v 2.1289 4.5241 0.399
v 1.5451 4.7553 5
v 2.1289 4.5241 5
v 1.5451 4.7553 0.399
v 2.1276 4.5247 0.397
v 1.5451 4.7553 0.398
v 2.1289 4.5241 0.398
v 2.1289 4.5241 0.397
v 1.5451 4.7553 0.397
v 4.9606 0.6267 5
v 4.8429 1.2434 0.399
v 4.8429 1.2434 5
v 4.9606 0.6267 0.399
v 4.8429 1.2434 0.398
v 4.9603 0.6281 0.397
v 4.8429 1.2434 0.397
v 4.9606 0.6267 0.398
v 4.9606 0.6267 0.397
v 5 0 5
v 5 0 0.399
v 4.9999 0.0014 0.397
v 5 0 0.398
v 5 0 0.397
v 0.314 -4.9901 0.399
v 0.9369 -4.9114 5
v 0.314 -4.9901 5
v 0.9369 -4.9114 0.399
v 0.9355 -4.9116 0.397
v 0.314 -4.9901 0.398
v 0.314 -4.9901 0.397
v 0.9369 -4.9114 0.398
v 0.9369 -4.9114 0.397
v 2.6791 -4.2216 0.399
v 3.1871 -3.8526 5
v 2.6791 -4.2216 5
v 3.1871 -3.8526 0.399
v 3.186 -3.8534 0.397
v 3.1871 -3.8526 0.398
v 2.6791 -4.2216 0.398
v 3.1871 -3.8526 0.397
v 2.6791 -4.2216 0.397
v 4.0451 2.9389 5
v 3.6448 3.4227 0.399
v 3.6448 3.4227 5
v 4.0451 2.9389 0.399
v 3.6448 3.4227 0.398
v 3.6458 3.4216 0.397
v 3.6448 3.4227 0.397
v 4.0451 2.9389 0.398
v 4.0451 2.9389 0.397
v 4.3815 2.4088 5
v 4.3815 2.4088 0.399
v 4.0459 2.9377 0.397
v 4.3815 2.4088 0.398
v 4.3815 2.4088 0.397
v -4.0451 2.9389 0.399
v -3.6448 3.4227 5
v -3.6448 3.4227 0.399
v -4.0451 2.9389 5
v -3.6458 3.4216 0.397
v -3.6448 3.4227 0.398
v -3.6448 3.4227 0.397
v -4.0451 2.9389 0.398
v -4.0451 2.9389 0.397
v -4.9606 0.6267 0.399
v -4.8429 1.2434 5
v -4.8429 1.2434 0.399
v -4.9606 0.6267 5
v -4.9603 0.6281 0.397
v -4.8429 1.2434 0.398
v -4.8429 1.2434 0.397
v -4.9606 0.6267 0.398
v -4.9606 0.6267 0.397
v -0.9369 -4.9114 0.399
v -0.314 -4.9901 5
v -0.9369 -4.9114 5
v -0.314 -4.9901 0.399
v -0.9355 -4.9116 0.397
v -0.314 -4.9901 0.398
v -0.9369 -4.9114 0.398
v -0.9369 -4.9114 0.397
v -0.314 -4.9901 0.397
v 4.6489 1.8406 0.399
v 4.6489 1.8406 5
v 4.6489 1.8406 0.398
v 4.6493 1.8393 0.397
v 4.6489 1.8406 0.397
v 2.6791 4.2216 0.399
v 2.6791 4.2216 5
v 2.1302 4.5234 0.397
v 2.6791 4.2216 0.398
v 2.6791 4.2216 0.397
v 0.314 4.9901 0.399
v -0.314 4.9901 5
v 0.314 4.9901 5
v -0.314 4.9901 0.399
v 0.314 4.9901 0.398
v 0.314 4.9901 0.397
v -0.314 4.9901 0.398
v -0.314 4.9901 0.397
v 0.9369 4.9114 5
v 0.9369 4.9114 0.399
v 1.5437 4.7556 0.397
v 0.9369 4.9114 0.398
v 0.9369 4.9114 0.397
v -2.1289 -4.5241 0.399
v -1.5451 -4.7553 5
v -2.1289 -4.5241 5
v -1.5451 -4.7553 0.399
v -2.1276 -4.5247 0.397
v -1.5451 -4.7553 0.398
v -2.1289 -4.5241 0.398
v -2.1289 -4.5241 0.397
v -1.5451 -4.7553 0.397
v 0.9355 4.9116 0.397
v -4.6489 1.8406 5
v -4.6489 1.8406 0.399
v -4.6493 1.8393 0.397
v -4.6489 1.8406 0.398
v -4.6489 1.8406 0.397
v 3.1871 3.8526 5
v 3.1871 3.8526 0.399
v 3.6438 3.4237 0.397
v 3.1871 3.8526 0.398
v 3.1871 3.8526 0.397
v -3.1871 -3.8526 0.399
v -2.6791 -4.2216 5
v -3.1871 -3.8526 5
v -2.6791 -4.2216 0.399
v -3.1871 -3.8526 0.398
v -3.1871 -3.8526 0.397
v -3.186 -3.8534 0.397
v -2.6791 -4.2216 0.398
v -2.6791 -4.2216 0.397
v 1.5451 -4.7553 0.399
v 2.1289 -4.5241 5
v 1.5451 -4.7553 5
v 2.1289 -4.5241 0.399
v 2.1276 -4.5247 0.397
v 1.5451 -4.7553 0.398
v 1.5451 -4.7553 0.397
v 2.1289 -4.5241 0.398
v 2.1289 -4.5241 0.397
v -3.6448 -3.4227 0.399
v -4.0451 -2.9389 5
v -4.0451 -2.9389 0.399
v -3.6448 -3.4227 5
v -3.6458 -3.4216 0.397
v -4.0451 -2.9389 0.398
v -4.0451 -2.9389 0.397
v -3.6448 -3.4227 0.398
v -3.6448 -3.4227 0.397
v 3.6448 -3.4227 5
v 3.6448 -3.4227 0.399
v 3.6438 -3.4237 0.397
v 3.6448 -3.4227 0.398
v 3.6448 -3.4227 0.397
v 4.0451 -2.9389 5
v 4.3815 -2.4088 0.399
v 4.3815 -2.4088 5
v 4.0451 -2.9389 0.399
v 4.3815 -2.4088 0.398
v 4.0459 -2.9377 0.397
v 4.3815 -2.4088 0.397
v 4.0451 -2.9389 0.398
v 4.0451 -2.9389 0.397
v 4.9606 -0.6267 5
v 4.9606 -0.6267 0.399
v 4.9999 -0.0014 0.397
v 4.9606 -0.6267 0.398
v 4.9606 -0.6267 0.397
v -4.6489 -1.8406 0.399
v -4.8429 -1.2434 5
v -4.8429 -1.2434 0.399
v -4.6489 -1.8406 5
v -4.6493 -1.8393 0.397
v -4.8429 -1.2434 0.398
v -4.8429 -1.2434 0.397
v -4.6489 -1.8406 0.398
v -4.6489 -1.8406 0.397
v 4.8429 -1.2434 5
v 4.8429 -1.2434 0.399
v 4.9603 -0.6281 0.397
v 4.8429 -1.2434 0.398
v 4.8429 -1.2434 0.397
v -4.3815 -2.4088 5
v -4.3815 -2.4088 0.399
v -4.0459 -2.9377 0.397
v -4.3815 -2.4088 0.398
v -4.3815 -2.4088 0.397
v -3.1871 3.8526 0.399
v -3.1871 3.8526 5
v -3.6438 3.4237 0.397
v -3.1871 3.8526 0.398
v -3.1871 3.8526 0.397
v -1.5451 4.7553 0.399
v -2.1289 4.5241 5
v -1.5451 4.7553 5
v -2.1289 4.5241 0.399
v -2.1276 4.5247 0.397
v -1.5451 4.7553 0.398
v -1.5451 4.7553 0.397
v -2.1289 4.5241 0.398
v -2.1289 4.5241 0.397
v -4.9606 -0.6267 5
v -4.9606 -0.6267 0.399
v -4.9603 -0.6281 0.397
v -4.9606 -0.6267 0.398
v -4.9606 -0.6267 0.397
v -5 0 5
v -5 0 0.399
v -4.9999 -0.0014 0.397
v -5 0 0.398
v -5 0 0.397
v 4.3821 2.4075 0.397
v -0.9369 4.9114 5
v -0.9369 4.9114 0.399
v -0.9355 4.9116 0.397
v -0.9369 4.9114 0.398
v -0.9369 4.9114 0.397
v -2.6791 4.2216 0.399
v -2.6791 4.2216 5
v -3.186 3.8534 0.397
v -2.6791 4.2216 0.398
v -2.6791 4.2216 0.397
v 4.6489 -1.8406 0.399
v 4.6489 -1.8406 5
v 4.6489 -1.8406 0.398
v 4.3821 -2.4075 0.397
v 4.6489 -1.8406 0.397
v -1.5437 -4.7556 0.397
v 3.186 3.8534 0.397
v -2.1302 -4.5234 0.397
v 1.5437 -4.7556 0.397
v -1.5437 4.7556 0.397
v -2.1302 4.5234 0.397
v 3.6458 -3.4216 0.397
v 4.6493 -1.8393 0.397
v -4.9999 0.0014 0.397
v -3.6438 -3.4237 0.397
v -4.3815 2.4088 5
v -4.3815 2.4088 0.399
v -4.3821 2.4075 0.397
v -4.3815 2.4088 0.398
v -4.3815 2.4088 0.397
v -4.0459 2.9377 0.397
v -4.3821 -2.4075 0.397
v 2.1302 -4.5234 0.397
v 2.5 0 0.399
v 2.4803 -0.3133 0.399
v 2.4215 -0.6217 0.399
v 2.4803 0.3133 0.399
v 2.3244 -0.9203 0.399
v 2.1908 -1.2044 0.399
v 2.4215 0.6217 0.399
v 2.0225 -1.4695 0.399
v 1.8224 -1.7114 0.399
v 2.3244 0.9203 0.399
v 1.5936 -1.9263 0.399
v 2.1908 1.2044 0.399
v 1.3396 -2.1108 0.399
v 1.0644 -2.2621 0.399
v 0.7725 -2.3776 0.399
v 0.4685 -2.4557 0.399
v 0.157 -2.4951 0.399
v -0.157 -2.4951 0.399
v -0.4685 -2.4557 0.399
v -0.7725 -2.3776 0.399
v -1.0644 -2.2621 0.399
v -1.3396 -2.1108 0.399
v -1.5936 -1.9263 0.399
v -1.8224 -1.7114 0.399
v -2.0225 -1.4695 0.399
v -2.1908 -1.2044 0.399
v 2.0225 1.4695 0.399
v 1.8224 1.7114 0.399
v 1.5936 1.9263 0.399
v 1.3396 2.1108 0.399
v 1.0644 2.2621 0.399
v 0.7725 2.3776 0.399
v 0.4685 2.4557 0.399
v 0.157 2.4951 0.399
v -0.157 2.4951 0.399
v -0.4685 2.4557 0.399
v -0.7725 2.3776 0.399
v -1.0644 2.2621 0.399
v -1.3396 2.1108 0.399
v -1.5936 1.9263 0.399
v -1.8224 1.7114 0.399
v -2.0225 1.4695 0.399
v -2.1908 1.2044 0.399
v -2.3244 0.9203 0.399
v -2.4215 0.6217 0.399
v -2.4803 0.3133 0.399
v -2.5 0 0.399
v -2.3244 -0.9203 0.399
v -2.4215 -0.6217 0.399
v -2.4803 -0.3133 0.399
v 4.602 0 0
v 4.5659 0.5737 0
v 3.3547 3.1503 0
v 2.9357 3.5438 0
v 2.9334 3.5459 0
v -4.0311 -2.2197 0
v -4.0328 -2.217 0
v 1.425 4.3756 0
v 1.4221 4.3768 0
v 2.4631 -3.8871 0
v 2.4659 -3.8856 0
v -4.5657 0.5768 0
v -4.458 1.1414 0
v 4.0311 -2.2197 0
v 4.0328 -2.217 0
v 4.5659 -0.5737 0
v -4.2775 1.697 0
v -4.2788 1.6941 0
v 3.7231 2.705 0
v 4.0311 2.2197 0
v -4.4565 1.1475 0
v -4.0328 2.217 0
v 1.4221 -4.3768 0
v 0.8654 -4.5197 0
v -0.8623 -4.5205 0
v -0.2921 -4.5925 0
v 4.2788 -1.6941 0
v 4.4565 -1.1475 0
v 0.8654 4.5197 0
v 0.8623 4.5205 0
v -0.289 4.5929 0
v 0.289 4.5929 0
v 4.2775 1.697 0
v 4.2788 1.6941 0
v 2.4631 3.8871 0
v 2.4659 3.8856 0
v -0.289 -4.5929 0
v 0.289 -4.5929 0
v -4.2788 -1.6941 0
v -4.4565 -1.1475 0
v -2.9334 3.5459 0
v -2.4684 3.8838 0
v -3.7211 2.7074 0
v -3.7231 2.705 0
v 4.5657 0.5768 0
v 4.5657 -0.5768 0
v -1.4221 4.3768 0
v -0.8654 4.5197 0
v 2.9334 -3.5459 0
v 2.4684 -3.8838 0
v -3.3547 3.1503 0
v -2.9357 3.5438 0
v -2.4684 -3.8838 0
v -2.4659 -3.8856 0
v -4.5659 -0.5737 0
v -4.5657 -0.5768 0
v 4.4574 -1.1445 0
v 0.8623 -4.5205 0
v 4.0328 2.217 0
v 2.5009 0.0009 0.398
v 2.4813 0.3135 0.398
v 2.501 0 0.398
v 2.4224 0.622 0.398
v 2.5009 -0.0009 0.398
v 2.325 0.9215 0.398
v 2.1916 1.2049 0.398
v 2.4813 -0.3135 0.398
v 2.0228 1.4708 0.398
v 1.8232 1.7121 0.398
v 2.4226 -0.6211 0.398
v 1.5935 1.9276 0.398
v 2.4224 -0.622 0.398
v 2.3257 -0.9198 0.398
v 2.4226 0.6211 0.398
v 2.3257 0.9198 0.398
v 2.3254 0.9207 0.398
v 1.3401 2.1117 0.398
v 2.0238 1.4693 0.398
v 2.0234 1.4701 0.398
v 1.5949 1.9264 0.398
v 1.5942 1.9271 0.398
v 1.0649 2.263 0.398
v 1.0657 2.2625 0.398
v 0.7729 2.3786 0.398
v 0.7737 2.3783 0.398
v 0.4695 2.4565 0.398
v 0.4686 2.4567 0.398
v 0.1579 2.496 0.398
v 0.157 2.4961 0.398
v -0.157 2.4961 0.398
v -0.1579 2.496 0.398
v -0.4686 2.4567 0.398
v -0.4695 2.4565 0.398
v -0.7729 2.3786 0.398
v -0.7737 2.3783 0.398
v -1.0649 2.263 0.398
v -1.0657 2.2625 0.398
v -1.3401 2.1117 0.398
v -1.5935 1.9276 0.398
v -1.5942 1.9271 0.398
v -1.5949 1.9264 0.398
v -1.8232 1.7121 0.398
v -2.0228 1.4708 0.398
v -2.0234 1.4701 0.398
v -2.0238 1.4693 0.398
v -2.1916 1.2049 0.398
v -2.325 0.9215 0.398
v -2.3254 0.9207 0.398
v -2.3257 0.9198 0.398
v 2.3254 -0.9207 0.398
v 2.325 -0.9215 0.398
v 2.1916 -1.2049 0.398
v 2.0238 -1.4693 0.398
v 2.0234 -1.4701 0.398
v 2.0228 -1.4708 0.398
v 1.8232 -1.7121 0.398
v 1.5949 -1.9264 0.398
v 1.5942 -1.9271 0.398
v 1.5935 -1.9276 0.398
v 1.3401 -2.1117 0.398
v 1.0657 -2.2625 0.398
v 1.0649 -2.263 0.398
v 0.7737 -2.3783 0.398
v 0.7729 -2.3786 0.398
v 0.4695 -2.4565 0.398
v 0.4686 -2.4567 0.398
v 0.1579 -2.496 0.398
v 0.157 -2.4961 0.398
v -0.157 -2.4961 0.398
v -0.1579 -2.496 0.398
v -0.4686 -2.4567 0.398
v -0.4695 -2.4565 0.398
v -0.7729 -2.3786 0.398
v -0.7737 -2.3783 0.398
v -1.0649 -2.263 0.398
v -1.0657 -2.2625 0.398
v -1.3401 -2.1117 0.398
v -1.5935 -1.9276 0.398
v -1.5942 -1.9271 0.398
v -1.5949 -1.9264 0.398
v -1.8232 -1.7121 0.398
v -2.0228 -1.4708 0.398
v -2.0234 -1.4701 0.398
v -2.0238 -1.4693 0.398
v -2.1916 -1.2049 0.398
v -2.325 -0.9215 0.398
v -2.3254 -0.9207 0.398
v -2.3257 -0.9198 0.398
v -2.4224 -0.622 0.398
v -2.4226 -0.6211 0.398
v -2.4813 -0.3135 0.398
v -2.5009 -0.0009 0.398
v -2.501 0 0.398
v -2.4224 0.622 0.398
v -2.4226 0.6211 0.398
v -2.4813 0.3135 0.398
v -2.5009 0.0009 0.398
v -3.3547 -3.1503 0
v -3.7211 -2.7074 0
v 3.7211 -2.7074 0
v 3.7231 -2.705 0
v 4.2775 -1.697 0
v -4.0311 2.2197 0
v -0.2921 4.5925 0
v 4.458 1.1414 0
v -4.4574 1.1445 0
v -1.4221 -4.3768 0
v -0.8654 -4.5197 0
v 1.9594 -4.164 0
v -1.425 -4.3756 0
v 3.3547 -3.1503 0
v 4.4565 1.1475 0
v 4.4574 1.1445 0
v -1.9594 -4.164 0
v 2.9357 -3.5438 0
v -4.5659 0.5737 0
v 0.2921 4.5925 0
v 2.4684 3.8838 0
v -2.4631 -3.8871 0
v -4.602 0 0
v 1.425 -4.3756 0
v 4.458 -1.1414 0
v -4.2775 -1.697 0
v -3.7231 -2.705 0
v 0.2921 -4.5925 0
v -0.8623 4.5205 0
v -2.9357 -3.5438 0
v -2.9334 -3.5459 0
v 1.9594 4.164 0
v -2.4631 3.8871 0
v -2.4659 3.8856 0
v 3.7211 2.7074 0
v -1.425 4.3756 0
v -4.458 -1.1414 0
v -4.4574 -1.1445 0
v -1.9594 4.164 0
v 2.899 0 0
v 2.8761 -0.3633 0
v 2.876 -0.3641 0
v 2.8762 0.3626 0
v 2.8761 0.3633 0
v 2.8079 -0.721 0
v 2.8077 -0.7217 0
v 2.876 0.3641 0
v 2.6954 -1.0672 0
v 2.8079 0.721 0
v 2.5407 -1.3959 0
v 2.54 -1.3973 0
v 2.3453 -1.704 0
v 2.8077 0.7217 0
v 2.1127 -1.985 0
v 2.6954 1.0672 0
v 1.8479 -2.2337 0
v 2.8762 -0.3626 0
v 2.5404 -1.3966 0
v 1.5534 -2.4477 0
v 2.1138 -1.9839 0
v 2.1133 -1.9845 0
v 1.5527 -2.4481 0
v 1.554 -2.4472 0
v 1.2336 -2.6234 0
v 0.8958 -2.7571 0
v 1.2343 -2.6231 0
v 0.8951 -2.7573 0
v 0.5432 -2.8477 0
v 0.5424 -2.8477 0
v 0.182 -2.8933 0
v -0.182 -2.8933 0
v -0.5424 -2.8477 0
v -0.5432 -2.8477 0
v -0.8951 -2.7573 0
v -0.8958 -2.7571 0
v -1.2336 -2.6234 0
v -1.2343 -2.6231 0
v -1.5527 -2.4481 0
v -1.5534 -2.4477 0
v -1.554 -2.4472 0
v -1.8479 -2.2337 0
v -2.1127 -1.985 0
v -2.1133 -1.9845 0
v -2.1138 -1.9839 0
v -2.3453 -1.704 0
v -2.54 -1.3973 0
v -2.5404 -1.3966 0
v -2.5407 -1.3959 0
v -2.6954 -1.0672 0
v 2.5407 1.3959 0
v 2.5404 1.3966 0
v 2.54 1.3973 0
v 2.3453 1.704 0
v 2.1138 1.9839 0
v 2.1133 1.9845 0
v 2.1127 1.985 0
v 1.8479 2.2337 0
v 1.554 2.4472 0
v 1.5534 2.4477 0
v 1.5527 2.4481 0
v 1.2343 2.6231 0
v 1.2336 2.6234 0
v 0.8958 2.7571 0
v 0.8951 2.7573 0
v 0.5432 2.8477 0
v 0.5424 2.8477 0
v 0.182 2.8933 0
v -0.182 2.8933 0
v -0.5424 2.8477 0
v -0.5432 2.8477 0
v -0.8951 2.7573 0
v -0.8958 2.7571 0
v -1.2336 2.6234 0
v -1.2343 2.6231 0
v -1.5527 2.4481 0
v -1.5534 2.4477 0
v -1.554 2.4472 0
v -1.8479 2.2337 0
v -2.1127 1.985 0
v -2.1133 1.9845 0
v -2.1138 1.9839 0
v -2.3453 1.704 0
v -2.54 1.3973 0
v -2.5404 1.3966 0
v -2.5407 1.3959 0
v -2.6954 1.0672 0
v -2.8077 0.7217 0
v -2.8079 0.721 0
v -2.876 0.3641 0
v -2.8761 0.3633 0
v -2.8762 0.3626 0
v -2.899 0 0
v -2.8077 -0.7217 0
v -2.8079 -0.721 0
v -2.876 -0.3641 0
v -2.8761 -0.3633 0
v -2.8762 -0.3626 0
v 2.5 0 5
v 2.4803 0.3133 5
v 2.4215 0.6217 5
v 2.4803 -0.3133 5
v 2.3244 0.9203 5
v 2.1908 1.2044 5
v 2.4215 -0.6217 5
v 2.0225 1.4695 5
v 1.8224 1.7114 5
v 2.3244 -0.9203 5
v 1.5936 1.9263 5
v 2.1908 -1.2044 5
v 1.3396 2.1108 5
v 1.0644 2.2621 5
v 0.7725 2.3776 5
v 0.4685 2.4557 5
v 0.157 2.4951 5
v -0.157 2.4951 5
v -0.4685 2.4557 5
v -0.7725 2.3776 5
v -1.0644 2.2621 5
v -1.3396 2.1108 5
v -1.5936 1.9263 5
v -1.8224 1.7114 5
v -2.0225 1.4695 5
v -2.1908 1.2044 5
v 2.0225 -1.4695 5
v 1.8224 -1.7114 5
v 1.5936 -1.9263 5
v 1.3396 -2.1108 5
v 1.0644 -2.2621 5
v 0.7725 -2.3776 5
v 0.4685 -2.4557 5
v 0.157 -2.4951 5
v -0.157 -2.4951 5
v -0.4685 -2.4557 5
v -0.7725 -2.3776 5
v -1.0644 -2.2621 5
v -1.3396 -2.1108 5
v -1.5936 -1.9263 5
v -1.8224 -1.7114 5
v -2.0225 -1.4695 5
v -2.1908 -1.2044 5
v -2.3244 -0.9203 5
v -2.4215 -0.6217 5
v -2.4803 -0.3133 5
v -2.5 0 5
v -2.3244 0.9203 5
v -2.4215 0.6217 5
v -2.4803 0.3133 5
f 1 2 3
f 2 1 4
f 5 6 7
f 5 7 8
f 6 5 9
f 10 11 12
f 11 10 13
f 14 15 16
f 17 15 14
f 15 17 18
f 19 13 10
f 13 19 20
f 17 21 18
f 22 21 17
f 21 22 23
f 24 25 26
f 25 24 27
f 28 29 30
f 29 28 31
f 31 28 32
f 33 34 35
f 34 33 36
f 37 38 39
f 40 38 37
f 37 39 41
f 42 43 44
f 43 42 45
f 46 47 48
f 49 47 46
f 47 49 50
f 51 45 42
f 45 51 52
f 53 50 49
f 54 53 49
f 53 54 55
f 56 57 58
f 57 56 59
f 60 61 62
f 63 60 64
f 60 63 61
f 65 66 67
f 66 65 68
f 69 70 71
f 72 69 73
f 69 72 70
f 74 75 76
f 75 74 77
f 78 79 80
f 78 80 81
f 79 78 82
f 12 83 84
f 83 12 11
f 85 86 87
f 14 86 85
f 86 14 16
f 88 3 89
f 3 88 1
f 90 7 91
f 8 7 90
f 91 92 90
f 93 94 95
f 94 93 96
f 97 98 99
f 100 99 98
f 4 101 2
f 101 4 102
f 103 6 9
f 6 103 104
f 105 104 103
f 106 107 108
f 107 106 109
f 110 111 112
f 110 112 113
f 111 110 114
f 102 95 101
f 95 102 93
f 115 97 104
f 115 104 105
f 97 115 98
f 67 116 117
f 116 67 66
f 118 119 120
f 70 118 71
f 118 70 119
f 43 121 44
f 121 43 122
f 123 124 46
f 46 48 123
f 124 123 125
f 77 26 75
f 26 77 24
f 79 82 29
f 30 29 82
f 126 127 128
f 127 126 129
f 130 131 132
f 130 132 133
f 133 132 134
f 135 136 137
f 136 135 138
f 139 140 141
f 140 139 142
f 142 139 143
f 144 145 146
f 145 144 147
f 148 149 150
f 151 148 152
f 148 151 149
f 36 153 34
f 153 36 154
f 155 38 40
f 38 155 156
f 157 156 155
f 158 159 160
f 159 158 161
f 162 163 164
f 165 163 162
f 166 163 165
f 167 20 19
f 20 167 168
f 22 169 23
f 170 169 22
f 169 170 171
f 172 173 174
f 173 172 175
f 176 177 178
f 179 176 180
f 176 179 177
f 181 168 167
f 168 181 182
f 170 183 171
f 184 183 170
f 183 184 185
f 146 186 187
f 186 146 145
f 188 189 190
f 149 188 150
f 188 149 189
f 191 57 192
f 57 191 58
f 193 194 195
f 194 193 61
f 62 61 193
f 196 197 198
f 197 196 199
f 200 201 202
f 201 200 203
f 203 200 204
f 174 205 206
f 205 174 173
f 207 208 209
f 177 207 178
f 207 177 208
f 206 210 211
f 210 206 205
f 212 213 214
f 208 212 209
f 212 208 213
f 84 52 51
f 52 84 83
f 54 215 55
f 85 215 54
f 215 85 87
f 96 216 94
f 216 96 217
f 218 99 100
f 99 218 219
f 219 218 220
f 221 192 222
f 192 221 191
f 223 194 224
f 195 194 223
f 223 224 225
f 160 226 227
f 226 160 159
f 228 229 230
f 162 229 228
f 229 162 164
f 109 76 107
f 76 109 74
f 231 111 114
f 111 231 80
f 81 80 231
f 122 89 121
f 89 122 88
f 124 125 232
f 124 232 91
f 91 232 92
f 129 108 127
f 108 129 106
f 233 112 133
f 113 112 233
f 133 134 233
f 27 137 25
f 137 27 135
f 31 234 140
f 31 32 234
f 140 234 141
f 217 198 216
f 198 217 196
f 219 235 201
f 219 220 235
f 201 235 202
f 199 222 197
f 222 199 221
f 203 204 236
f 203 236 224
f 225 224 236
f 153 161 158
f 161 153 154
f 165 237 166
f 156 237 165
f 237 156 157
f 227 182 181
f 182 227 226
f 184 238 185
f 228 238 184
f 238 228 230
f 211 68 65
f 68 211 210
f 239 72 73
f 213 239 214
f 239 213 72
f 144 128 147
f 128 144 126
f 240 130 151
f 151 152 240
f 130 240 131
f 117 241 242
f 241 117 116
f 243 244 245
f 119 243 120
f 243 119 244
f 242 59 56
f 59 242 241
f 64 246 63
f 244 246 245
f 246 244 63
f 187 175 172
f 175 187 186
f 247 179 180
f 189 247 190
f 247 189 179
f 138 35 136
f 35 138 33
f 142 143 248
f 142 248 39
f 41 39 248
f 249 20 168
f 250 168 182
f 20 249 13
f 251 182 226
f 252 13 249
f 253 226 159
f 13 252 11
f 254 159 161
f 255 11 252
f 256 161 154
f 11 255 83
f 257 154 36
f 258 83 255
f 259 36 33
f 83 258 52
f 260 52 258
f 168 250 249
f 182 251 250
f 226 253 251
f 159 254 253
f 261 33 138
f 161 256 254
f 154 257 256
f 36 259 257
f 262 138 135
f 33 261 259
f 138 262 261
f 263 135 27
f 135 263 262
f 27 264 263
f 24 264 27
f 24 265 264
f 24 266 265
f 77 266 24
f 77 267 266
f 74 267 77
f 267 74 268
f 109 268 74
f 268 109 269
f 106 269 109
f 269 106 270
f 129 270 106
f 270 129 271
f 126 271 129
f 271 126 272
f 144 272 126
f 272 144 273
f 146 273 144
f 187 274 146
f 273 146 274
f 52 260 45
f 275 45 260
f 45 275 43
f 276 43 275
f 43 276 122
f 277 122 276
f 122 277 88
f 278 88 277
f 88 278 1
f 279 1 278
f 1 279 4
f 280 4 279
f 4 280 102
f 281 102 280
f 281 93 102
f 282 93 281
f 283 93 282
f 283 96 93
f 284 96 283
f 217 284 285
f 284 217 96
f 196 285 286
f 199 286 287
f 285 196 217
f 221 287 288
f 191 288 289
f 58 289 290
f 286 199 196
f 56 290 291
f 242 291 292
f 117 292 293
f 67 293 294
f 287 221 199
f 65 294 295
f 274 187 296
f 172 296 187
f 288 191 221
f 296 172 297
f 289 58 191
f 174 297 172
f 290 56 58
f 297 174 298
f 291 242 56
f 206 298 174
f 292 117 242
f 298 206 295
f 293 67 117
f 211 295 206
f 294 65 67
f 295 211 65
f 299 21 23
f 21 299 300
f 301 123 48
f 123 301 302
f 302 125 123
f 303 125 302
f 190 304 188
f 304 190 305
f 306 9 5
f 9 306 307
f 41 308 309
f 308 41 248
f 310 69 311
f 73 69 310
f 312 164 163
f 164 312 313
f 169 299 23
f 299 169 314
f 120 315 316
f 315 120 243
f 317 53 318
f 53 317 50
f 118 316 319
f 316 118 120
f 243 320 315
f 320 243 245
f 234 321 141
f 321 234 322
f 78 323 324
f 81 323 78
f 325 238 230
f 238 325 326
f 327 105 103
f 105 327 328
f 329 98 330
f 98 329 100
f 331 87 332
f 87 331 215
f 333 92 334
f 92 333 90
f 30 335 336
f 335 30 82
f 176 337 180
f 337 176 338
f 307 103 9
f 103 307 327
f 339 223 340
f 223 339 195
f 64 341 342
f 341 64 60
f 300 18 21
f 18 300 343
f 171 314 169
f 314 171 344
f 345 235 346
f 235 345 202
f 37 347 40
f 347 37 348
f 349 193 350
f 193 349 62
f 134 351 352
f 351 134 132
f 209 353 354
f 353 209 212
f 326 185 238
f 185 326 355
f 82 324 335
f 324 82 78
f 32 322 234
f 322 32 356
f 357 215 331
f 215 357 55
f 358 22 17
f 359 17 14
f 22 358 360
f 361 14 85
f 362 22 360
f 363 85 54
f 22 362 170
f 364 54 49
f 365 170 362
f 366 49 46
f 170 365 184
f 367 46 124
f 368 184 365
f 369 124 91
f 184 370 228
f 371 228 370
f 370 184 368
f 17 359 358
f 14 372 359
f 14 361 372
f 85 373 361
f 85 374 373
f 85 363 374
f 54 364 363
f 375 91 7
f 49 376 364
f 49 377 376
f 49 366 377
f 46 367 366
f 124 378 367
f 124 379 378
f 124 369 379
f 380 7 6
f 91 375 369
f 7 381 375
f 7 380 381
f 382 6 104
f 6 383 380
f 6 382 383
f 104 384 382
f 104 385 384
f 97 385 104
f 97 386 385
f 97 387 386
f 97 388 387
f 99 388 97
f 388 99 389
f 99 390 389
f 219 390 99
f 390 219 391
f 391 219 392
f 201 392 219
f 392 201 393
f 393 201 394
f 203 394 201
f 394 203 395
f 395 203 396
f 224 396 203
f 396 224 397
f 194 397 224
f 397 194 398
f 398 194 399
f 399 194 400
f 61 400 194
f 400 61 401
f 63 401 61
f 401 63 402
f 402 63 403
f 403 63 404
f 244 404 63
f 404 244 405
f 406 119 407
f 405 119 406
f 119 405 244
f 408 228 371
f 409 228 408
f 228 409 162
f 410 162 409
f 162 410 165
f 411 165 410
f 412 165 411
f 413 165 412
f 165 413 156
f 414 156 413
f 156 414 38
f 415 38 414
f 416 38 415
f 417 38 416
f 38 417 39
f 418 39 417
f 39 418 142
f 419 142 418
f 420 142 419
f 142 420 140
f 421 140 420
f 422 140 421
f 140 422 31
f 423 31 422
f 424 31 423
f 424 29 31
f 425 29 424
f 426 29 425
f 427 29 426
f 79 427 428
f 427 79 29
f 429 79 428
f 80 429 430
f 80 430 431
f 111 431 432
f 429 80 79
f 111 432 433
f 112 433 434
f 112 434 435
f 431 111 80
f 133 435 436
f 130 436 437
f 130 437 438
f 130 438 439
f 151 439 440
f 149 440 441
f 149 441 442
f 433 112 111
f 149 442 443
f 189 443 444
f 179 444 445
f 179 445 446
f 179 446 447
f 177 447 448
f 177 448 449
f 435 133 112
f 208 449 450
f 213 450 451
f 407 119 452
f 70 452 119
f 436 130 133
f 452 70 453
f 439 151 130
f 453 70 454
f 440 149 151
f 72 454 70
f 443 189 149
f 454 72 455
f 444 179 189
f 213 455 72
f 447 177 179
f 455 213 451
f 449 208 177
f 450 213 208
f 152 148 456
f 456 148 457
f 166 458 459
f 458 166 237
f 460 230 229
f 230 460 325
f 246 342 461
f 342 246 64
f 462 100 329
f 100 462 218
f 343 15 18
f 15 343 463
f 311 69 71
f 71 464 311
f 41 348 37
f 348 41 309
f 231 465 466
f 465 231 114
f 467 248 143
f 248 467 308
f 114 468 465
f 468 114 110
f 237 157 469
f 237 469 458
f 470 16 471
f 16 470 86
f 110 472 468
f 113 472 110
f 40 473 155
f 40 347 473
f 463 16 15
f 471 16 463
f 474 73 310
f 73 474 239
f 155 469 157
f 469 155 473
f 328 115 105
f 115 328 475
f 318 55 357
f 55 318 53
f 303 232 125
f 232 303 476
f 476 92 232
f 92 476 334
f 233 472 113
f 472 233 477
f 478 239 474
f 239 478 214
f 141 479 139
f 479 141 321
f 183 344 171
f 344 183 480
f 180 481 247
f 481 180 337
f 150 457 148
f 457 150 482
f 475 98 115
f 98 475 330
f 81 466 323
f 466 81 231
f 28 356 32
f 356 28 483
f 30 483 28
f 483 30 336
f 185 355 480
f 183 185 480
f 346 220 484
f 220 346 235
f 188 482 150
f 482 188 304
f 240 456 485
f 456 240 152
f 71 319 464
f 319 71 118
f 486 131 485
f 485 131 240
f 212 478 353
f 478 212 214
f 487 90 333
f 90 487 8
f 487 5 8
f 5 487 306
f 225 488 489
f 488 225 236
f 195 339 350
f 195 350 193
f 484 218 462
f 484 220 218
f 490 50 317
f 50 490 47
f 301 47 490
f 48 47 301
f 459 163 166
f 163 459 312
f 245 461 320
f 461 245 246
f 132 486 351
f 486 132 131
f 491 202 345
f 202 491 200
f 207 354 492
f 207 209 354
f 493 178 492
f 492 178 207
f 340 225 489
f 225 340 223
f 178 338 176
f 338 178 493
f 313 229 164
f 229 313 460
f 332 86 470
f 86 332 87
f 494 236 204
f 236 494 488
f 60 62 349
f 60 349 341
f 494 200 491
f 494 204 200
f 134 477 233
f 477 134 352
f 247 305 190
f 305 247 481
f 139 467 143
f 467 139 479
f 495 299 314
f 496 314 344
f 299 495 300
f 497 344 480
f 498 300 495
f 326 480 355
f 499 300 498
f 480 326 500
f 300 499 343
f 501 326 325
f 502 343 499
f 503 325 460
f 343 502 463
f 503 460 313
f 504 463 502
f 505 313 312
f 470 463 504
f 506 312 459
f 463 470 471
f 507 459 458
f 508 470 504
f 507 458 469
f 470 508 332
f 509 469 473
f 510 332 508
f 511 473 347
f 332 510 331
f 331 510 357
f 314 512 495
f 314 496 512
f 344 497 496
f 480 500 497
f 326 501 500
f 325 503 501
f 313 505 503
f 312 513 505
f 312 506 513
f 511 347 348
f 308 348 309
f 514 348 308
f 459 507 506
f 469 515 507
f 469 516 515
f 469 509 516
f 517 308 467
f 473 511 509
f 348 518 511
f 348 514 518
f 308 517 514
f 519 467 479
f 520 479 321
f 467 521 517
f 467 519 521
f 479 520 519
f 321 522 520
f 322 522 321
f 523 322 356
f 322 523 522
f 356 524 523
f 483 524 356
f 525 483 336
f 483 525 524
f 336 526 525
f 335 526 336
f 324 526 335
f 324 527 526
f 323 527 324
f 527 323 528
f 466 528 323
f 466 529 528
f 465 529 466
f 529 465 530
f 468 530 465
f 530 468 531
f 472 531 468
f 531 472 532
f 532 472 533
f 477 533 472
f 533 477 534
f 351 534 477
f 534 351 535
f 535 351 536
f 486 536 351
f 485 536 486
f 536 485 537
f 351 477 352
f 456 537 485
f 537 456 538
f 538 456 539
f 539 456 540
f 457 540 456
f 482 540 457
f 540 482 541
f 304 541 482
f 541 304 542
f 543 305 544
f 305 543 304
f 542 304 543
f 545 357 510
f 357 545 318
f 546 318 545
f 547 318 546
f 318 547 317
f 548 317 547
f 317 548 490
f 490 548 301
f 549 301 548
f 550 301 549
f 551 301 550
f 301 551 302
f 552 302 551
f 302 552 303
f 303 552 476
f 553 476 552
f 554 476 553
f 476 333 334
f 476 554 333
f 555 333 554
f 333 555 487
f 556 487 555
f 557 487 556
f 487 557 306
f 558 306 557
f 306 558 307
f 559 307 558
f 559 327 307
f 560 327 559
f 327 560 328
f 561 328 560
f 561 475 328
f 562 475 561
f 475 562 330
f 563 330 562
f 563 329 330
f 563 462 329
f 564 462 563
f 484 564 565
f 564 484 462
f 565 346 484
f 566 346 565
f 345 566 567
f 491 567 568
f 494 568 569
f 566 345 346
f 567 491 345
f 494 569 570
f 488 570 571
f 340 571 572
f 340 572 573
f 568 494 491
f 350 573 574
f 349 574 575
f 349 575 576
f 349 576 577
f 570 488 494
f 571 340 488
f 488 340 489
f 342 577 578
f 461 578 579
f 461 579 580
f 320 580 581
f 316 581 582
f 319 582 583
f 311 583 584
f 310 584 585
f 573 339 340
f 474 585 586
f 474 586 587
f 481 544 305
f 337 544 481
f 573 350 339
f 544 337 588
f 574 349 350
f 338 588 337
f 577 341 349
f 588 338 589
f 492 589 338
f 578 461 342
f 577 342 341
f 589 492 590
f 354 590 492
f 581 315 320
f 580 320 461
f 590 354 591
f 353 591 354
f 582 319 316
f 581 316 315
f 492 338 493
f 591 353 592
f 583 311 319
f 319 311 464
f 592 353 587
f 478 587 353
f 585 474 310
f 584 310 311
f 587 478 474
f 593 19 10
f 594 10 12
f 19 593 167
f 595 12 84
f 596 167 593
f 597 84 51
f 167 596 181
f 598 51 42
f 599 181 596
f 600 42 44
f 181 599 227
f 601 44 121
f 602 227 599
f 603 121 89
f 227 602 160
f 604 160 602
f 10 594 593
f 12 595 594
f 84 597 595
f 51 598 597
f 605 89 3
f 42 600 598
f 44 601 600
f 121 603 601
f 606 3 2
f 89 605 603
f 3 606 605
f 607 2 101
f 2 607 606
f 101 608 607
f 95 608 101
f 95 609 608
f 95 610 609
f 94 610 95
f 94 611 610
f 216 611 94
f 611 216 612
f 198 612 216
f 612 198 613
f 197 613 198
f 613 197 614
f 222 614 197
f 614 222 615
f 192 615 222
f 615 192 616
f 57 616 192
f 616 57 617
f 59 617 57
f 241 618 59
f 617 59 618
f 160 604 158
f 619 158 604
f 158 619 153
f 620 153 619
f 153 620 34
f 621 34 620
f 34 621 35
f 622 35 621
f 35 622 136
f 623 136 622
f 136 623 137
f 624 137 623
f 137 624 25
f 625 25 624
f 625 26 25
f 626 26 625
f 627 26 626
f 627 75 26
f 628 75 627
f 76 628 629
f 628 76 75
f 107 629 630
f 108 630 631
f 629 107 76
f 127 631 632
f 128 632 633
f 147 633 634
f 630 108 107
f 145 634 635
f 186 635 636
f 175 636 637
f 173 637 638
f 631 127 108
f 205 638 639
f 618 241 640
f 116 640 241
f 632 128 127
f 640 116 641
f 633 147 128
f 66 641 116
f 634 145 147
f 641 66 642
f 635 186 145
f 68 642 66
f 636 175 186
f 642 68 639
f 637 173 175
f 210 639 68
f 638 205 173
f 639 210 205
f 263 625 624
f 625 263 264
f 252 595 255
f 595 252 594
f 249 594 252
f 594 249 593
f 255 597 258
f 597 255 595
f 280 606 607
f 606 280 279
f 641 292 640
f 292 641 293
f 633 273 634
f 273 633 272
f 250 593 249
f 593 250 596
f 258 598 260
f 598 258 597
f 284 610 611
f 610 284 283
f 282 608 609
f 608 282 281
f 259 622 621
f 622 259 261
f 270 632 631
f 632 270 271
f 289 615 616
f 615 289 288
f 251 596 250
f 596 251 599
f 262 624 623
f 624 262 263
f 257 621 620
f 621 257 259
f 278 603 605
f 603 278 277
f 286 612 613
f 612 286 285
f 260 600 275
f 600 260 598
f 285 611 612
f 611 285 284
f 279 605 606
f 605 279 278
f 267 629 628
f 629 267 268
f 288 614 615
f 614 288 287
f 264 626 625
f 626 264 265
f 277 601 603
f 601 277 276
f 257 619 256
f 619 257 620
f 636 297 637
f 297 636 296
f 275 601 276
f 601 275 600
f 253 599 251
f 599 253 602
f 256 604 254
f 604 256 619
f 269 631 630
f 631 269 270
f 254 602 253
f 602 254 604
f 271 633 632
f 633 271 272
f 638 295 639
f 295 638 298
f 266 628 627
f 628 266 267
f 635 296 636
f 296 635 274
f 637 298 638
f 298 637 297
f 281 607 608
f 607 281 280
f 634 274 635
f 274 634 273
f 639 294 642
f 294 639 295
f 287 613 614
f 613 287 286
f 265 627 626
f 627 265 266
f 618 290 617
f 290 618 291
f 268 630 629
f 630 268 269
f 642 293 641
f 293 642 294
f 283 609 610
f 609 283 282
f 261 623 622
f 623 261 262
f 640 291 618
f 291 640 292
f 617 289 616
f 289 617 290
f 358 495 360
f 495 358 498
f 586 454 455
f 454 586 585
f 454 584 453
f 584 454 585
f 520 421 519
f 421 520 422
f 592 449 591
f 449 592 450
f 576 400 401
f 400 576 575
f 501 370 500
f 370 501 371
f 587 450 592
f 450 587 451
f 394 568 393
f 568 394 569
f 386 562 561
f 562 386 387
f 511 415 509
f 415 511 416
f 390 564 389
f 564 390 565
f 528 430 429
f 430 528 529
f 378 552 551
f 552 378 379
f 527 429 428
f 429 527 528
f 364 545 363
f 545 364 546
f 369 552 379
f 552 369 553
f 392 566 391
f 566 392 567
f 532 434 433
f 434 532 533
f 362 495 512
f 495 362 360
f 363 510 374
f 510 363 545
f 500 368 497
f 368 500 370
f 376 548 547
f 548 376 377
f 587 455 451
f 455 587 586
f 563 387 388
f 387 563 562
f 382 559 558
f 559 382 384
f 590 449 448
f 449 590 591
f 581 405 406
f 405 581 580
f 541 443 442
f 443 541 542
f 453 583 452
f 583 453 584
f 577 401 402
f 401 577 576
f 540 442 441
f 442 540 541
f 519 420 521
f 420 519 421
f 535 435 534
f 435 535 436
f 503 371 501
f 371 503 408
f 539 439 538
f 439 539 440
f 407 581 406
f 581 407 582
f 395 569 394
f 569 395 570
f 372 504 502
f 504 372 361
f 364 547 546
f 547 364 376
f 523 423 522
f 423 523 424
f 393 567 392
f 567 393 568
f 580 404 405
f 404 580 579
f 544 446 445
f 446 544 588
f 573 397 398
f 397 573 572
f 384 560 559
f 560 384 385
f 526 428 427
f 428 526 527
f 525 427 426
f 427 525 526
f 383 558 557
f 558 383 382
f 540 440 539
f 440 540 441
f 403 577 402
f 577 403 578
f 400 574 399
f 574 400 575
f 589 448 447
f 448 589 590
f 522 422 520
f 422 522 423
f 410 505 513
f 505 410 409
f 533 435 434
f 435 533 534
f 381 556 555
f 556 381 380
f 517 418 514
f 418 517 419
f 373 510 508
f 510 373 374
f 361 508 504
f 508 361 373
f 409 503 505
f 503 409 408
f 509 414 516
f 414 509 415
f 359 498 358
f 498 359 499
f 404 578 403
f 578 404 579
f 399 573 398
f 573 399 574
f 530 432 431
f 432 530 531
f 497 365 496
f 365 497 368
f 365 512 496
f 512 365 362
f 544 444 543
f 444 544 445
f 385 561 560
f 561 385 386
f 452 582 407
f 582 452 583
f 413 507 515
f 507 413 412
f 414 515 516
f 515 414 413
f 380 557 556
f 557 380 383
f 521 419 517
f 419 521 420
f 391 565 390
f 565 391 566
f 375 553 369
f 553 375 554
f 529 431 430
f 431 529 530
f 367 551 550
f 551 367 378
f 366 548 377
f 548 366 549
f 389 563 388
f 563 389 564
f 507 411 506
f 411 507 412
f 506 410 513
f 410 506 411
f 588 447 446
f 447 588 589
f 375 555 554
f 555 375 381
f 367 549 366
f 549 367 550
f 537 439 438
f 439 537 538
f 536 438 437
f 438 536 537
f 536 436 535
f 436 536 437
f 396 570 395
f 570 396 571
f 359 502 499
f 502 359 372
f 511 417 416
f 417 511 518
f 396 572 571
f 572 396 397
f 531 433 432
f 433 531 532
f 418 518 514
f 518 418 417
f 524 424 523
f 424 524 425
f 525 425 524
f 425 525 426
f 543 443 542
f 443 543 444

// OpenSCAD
// height in mm
height = 5;

// inner diameter in mm
inner_diameter = 5;

// outer diameter in mm
outer_diameter = 10;

// inner chamfer at bottom in mm (to avoid 'elephant foot' when 3d printing)
chamfer_inner = 0.4;

// outer chamfer at bottom in mm (to avoid 'elephant foot' when 3d printing)
chamfer_outer = 0.4;

/* [Hidden] */

inner_radius = inner_diameter/2;
outer_radius = outer_diameter/2;
eps = 0.001;

$fn = 50;

difference() 
{
	cylinder(h=height, r=outer_radius);
	translate([0,0,-eps]) cylinder(h=height+1, r=inner_radius);

	translate([0,0,-eps]) cylinder(h=chamfer_inner, r1=inner_radius+chamfer_inner, r2=inner_radius);
    
    translate([0,0,-eps]) difference()
    {
        cylinder(h=chamfer_outer, r=outer_radius);
        translate([0,0,-eps]) cylinder(h=chamfer_outer, r1=outer_radius-chamfer_outer, r2=outer_radius+eps);
    }
}
